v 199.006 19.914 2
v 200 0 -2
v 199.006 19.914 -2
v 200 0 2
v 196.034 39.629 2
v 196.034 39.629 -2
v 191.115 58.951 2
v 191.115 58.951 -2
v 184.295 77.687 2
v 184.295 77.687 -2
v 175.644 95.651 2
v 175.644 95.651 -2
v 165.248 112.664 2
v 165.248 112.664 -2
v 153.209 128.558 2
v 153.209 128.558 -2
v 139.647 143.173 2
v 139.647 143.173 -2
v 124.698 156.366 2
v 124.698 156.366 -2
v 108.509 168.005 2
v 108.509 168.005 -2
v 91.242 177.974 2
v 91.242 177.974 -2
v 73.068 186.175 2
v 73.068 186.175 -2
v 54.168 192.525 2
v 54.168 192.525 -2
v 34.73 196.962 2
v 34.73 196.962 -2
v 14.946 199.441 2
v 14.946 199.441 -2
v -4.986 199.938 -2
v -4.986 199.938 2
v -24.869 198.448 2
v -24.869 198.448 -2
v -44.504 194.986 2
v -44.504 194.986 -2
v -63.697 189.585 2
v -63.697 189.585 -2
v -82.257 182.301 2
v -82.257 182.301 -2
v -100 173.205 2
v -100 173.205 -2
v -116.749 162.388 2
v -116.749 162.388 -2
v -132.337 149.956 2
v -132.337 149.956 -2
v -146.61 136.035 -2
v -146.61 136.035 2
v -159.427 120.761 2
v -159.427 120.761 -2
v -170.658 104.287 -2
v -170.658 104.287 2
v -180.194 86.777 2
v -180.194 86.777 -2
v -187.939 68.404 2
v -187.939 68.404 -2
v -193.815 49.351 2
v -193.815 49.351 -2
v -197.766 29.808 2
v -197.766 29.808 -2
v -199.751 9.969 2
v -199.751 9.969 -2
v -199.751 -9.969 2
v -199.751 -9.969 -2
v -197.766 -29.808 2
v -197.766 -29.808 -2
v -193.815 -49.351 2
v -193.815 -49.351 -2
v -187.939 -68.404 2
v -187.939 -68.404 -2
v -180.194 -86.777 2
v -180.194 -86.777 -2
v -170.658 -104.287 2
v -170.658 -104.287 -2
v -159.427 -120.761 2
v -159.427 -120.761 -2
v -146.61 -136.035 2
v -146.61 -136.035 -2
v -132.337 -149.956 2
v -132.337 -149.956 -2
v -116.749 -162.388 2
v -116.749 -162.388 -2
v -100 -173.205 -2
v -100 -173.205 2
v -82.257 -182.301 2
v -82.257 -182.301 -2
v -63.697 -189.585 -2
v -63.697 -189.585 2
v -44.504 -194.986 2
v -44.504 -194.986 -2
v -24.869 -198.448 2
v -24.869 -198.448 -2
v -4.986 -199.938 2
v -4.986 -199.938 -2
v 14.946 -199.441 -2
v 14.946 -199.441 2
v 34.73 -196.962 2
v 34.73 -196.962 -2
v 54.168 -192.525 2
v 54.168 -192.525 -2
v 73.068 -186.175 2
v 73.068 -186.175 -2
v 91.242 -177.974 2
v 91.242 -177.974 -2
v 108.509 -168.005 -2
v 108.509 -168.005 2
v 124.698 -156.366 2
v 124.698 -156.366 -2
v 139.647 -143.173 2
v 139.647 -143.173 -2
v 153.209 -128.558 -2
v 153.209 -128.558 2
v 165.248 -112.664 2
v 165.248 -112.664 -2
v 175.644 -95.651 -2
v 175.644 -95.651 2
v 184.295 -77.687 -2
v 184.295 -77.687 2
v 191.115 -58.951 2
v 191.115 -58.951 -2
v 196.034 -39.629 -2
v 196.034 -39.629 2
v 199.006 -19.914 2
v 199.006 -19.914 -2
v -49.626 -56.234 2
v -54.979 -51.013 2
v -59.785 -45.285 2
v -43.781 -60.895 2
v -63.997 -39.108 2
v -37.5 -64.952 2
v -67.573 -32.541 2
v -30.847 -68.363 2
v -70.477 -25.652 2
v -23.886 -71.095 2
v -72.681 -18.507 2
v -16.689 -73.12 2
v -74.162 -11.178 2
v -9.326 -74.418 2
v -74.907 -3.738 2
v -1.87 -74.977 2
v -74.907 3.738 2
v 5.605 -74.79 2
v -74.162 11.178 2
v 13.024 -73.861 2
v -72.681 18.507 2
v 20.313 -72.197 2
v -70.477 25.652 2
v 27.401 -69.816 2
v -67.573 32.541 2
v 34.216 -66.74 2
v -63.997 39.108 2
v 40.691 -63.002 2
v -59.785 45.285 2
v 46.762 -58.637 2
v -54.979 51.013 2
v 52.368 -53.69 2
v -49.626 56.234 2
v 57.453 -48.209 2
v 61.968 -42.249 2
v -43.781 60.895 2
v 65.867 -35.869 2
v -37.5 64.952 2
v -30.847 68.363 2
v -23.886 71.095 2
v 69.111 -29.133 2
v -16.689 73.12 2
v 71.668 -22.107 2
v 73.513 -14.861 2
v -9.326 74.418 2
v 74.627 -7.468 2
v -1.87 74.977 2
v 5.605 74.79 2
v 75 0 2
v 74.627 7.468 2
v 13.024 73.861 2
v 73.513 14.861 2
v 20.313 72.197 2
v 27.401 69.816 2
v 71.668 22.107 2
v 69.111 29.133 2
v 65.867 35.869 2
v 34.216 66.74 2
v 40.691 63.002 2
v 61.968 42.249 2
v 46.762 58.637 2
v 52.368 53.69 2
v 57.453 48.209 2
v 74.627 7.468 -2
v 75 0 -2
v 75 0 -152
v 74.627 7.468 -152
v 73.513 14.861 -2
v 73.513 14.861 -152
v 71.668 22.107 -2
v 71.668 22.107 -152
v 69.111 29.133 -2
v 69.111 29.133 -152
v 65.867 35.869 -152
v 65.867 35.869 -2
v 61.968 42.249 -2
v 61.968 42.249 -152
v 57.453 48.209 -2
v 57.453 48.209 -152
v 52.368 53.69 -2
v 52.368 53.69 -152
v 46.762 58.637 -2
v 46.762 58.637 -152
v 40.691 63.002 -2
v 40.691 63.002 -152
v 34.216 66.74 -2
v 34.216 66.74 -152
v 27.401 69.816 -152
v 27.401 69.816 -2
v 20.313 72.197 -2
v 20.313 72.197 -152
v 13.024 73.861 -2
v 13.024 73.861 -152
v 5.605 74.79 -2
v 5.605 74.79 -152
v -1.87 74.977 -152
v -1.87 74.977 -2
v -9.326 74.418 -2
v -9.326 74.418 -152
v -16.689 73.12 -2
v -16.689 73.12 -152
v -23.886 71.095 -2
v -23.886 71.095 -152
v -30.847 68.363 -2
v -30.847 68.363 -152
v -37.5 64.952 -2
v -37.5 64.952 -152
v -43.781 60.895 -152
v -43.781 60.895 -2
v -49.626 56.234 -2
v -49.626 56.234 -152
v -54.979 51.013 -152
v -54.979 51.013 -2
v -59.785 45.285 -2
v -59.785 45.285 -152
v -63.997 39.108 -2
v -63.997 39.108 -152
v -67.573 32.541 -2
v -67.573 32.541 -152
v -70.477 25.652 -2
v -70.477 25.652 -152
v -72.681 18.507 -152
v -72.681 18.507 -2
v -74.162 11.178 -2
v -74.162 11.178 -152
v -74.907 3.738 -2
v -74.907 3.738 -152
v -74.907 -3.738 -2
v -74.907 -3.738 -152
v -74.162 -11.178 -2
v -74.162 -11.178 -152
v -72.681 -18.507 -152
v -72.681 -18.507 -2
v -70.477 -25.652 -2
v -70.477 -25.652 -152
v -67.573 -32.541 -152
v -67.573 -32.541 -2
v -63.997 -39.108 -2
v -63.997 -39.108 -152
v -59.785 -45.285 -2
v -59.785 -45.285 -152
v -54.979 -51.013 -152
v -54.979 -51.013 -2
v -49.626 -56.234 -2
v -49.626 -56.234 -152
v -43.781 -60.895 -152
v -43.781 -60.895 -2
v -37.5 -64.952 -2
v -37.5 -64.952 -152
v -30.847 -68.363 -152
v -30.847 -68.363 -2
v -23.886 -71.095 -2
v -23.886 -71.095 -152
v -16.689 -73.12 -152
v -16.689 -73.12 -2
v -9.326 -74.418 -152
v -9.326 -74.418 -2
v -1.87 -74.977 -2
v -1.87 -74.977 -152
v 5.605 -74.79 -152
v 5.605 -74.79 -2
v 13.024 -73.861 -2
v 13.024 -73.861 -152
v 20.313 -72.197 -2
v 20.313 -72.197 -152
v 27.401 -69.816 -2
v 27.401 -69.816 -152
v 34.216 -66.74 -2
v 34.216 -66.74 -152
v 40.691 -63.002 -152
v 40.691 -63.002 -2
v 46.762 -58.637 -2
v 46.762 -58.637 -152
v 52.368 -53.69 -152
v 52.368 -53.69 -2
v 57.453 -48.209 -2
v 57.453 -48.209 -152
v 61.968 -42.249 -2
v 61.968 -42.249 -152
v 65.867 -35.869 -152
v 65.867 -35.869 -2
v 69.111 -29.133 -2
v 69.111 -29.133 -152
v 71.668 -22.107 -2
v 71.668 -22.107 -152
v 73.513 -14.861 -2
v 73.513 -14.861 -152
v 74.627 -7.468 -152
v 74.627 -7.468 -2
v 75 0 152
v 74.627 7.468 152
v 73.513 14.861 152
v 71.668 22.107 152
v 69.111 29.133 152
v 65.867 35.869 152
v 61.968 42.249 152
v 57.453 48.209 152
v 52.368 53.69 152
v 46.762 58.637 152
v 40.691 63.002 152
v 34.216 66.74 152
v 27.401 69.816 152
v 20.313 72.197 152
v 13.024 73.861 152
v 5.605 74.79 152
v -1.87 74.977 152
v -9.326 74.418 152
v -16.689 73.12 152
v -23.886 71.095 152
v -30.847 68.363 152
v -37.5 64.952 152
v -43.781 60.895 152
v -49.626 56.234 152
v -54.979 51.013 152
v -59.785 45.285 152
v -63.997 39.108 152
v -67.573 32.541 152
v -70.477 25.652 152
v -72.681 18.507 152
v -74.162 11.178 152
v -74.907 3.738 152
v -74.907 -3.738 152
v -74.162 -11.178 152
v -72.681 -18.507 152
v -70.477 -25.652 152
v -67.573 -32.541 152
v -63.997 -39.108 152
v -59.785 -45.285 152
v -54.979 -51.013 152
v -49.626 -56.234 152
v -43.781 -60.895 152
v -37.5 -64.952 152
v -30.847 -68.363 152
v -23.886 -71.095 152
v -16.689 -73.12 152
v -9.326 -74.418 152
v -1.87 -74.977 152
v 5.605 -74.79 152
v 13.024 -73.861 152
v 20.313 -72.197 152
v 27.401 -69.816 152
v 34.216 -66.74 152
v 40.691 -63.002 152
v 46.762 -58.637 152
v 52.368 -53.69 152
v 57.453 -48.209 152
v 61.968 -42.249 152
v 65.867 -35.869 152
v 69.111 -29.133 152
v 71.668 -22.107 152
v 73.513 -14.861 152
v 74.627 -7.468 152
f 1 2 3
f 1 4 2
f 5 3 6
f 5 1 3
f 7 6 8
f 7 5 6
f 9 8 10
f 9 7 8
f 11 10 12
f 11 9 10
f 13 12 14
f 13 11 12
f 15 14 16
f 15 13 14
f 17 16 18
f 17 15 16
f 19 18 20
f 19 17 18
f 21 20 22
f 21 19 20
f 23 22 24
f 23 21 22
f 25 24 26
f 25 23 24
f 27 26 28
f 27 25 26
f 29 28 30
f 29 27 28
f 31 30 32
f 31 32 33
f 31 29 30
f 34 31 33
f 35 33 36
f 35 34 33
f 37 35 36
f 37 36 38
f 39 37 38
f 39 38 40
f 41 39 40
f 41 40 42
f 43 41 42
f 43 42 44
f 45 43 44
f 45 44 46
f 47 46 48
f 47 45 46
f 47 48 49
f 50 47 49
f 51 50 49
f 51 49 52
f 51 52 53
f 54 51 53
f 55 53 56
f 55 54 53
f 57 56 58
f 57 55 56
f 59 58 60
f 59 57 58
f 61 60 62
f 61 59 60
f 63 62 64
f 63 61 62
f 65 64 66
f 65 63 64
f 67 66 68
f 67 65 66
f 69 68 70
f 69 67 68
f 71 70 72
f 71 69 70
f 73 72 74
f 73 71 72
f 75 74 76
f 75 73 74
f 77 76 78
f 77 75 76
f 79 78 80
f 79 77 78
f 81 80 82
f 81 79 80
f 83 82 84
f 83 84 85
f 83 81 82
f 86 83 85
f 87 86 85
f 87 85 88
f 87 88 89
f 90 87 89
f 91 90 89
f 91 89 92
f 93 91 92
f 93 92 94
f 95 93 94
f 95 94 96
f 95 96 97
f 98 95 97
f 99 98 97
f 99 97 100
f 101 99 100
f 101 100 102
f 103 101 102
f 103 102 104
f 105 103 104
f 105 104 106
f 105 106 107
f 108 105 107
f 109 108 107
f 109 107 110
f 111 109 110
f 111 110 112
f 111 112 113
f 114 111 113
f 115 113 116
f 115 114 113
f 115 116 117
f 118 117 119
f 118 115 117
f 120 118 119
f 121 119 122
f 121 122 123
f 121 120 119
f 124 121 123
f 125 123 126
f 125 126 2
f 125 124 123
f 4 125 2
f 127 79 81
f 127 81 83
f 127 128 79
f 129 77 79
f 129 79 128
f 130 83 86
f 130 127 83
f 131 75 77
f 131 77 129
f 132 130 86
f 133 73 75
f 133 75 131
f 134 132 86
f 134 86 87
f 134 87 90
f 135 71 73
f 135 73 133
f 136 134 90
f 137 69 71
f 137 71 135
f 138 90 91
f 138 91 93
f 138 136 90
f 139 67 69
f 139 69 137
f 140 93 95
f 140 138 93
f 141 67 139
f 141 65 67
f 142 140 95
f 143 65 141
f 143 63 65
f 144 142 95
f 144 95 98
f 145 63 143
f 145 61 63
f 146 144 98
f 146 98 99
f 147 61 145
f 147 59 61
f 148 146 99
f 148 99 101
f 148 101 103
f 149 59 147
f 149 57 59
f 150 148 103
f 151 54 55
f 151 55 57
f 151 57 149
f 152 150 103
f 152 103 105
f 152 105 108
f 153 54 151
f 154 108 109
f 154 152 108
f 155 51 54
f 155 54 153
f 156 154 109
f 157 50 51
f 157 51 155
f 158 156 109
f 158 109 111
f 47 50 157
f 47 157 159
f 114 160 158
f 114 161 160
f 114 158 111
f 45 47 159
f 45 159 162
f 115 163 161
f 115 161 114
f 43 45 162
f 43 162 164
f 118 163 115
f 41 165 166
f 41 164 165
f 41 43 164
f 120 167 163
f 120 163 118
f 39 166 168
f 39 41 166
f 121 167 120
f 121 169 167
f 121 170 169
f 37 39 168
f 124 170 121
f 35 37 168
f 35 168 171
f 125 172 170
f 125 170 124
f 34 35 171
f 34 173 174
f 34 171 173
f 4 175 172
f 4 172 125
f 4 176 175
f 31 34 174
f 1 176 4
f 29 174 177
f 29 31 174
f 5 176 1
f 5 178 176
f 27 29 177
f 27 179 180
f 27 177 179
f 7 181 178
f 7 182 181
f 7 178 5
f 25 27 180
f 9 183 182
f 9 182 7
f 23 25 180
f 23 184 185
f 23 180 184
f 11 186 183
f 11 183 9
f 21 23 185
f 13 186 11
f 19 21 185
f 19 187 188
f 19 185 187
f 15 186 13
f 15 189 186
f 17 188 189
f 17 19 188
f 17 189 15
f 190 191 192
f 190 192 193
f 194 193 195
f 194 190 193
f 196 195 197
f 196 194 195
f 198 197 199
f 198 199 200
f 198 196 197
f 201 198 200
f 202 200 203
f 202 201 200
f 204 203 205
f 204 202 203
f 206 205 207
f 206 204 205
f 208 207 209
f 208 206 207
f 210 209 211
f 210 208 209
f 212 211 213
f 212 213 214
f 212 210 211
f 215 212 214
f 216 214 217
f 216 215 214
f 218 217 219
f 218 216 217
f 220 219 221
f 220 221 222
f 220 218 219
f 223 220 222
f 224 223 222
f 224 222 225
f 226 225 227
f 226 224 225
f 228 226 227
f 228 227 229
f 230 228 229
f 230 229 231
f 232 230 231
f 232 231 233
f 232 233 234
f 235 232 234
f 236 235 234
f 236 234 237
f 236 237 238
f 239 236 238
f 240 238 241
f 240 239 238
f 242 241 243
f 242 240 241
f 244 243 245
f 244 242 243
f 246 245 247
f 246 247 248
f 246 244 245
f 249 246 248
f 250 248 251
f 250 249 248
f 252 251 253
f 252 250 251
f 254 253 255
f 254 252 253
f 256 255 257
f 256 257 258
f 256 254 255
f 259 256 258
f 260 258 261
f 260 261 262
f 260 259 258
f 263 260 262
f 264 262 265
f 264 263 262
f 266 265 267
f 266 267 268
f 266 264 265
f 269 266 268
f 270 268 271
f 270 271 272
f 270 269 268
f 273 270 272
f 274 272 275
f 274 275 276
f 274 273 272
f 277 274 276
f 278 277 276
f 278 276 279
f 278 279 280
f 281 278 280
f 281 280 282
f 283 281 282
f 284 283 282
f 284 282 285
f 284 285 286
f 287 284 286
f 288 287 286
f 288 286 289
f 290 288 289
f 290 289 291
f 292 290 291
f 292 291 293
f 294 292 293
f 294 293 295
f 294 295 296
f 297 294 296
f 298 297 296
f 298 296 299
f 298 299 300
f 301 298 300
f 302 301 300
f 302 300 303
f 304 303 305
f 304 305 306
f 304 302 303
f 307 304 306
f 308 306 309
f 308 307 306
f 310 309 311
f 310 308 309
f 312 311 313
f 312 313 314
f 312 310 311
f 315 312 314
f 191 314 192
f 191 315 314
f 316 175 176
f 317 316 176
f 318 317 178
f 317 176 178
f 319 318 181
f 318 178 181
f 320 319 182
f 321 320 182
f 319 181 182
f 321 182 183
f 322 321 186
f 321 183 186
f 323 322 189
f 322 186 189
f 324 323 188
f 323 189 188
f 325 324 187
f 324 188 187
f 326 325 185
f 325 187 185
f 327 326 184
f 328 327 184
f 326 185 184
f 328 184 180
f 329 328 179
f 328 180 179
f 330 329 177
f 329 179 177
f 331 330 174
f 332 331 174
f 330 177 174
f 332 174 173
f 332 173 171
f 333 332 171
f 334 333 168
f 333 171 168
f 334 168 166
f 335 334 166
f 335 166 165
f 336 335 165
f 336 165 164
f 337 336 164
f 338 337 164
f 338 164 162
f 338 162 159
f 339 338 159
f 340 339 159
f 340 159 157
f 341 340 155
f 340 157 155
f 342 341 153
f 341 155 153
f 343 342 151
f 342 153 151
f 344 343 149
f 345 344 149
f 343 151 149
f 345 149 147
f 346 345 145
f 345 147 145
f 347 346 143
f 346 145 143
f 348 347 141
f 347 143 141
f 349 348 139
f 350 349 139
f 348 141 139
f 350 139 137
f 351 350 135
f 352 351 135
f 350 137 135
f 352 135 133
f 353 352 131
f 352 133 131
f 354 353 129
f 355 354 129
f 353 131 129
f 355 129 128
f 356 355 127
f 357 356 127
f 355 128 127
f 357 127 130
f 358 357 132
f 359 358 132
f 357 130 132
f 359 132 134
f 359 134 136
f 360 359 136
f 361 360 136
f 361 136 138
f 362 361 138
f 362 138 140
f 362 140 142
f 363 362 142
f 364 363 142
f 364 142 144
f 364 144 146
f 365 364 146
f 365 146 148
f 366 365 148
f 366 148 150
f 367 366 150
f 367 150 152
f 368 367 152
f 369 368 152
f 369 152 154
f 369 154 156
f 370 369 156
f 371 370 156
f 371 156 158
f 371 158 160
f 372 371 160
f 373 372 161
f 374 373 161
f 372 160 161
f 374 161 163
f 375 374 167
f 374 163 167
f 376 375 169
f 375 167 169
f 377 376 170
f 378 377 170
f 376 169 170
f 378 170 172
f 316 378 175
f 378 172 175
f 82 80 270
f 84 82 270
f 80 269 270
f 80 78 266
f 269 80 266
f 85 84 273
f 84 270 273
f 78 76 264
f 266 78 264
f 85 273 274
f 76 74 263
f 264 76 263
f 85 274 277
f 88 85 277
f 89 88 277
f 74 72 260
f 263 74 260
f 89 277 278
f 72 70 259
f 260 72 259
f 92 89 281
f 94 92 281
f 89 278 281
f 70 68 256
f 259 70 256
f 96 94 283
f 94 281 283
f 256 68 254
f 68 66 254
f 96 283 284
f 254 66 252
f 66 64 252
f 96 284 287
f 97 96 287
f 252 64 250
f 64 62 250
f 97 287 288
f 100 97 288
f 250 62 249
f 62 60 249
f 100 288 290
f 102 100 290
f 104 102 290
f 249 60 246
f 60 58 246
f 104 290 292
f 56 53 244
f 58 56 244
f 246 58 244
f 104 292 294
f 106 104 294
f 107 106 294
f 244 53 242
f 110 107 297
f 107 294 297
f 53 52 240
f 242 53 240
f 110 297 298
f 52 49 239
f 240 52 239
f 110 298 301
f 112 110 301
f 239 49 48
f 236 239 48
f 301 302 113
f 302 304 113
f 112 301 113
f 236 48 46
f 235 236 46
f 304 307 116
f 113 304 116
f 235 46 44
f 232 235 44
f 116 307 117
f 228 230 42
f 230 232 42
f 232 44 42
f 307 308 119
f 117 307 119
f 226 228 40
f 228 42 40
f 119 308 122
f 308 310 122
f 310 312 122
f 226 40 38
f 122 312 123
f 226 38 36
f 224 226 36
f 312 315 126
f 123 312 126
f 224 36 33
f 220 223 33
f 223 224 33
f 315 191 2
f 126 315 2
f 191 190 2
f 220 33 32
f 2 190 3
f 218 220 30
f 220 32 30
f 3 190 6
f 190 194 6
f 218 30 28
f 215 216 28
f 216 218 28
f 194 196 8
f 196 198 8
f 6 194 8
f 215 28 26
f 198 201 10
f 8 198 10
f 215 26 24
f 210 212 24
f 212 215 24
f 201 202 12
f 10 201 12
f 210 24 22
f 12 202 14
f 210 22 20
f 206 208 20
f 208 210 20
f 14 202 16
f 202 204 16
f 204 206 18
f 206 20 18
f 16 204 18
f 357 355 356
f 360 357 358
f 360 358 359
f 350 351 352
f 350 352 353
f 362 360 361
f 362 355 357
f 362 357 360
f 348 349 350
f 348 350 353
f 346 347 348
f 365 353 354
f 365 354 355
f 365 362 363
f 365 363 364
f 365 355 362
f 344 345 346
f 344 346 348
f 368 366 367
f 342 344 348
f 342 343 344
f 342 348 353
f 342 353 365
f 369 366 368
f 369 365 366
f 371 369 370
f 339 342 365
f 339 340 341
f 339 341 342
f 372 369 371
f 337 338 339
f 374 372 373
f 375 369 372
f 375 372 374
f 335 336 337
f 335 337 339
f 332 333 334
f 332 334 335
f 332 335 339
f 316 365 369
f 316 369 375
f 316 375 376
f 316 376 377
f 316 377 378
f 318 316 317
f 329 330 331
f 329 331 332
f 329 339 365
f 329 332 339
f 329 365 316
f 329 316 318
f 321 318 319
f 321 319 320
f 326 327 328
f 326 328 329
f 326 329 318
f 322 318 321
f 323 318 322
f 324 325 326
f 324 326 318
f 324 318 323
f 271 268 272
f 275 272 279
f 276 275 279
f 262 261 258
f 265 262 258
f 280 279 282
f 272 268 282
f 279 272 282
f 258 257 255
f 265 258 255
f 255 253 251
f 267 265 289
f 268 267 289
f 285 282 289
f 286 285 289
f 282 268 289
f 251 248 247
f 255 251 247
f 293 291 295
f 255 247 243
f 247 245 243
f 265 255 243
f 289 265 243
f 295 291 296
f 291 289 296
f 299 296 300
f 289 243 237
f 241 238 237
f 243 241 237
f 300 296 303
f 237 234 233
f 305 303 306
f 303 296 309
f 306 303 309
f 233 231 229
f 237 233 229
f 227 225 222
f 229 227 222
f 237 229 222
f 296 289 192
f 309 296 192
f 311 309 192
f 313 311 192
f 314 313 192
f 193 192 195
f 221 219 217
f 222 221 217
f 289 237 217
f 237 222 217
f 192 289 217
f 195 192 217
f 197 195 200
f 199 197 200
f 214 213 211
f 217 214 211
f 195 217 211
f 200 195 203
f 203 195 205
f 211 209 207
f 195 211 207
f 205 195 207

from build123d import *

# Parameters (mm, degrees)
F0_R     = 200
F1_DEPTH = 2
F2_R     = 75
F3_DEPTH = 150


with BuildPart() as f1:
    # F0 (on Top) → F1 (new body)
    with BuildSketch(Plane.XY):
        Circle(F0_R)
    extrude(amount=F1_DEPTH)

    # F2 (on face) → F3 (join)
    with BuildSketch(Plane.XY.offset(2)):
        Circle(F2_R)
    extrude(amount=F3_DEPTH)

    # F4: F1 across face


with BuildPart() as f1_1:
    add(f1.part)
    add(f1.part.mirror(Plane(origin=(0, 0, 0), x_dir=(1, 0, 0), z_dir=(0, 0, -1))))


solid = f1_1.part
